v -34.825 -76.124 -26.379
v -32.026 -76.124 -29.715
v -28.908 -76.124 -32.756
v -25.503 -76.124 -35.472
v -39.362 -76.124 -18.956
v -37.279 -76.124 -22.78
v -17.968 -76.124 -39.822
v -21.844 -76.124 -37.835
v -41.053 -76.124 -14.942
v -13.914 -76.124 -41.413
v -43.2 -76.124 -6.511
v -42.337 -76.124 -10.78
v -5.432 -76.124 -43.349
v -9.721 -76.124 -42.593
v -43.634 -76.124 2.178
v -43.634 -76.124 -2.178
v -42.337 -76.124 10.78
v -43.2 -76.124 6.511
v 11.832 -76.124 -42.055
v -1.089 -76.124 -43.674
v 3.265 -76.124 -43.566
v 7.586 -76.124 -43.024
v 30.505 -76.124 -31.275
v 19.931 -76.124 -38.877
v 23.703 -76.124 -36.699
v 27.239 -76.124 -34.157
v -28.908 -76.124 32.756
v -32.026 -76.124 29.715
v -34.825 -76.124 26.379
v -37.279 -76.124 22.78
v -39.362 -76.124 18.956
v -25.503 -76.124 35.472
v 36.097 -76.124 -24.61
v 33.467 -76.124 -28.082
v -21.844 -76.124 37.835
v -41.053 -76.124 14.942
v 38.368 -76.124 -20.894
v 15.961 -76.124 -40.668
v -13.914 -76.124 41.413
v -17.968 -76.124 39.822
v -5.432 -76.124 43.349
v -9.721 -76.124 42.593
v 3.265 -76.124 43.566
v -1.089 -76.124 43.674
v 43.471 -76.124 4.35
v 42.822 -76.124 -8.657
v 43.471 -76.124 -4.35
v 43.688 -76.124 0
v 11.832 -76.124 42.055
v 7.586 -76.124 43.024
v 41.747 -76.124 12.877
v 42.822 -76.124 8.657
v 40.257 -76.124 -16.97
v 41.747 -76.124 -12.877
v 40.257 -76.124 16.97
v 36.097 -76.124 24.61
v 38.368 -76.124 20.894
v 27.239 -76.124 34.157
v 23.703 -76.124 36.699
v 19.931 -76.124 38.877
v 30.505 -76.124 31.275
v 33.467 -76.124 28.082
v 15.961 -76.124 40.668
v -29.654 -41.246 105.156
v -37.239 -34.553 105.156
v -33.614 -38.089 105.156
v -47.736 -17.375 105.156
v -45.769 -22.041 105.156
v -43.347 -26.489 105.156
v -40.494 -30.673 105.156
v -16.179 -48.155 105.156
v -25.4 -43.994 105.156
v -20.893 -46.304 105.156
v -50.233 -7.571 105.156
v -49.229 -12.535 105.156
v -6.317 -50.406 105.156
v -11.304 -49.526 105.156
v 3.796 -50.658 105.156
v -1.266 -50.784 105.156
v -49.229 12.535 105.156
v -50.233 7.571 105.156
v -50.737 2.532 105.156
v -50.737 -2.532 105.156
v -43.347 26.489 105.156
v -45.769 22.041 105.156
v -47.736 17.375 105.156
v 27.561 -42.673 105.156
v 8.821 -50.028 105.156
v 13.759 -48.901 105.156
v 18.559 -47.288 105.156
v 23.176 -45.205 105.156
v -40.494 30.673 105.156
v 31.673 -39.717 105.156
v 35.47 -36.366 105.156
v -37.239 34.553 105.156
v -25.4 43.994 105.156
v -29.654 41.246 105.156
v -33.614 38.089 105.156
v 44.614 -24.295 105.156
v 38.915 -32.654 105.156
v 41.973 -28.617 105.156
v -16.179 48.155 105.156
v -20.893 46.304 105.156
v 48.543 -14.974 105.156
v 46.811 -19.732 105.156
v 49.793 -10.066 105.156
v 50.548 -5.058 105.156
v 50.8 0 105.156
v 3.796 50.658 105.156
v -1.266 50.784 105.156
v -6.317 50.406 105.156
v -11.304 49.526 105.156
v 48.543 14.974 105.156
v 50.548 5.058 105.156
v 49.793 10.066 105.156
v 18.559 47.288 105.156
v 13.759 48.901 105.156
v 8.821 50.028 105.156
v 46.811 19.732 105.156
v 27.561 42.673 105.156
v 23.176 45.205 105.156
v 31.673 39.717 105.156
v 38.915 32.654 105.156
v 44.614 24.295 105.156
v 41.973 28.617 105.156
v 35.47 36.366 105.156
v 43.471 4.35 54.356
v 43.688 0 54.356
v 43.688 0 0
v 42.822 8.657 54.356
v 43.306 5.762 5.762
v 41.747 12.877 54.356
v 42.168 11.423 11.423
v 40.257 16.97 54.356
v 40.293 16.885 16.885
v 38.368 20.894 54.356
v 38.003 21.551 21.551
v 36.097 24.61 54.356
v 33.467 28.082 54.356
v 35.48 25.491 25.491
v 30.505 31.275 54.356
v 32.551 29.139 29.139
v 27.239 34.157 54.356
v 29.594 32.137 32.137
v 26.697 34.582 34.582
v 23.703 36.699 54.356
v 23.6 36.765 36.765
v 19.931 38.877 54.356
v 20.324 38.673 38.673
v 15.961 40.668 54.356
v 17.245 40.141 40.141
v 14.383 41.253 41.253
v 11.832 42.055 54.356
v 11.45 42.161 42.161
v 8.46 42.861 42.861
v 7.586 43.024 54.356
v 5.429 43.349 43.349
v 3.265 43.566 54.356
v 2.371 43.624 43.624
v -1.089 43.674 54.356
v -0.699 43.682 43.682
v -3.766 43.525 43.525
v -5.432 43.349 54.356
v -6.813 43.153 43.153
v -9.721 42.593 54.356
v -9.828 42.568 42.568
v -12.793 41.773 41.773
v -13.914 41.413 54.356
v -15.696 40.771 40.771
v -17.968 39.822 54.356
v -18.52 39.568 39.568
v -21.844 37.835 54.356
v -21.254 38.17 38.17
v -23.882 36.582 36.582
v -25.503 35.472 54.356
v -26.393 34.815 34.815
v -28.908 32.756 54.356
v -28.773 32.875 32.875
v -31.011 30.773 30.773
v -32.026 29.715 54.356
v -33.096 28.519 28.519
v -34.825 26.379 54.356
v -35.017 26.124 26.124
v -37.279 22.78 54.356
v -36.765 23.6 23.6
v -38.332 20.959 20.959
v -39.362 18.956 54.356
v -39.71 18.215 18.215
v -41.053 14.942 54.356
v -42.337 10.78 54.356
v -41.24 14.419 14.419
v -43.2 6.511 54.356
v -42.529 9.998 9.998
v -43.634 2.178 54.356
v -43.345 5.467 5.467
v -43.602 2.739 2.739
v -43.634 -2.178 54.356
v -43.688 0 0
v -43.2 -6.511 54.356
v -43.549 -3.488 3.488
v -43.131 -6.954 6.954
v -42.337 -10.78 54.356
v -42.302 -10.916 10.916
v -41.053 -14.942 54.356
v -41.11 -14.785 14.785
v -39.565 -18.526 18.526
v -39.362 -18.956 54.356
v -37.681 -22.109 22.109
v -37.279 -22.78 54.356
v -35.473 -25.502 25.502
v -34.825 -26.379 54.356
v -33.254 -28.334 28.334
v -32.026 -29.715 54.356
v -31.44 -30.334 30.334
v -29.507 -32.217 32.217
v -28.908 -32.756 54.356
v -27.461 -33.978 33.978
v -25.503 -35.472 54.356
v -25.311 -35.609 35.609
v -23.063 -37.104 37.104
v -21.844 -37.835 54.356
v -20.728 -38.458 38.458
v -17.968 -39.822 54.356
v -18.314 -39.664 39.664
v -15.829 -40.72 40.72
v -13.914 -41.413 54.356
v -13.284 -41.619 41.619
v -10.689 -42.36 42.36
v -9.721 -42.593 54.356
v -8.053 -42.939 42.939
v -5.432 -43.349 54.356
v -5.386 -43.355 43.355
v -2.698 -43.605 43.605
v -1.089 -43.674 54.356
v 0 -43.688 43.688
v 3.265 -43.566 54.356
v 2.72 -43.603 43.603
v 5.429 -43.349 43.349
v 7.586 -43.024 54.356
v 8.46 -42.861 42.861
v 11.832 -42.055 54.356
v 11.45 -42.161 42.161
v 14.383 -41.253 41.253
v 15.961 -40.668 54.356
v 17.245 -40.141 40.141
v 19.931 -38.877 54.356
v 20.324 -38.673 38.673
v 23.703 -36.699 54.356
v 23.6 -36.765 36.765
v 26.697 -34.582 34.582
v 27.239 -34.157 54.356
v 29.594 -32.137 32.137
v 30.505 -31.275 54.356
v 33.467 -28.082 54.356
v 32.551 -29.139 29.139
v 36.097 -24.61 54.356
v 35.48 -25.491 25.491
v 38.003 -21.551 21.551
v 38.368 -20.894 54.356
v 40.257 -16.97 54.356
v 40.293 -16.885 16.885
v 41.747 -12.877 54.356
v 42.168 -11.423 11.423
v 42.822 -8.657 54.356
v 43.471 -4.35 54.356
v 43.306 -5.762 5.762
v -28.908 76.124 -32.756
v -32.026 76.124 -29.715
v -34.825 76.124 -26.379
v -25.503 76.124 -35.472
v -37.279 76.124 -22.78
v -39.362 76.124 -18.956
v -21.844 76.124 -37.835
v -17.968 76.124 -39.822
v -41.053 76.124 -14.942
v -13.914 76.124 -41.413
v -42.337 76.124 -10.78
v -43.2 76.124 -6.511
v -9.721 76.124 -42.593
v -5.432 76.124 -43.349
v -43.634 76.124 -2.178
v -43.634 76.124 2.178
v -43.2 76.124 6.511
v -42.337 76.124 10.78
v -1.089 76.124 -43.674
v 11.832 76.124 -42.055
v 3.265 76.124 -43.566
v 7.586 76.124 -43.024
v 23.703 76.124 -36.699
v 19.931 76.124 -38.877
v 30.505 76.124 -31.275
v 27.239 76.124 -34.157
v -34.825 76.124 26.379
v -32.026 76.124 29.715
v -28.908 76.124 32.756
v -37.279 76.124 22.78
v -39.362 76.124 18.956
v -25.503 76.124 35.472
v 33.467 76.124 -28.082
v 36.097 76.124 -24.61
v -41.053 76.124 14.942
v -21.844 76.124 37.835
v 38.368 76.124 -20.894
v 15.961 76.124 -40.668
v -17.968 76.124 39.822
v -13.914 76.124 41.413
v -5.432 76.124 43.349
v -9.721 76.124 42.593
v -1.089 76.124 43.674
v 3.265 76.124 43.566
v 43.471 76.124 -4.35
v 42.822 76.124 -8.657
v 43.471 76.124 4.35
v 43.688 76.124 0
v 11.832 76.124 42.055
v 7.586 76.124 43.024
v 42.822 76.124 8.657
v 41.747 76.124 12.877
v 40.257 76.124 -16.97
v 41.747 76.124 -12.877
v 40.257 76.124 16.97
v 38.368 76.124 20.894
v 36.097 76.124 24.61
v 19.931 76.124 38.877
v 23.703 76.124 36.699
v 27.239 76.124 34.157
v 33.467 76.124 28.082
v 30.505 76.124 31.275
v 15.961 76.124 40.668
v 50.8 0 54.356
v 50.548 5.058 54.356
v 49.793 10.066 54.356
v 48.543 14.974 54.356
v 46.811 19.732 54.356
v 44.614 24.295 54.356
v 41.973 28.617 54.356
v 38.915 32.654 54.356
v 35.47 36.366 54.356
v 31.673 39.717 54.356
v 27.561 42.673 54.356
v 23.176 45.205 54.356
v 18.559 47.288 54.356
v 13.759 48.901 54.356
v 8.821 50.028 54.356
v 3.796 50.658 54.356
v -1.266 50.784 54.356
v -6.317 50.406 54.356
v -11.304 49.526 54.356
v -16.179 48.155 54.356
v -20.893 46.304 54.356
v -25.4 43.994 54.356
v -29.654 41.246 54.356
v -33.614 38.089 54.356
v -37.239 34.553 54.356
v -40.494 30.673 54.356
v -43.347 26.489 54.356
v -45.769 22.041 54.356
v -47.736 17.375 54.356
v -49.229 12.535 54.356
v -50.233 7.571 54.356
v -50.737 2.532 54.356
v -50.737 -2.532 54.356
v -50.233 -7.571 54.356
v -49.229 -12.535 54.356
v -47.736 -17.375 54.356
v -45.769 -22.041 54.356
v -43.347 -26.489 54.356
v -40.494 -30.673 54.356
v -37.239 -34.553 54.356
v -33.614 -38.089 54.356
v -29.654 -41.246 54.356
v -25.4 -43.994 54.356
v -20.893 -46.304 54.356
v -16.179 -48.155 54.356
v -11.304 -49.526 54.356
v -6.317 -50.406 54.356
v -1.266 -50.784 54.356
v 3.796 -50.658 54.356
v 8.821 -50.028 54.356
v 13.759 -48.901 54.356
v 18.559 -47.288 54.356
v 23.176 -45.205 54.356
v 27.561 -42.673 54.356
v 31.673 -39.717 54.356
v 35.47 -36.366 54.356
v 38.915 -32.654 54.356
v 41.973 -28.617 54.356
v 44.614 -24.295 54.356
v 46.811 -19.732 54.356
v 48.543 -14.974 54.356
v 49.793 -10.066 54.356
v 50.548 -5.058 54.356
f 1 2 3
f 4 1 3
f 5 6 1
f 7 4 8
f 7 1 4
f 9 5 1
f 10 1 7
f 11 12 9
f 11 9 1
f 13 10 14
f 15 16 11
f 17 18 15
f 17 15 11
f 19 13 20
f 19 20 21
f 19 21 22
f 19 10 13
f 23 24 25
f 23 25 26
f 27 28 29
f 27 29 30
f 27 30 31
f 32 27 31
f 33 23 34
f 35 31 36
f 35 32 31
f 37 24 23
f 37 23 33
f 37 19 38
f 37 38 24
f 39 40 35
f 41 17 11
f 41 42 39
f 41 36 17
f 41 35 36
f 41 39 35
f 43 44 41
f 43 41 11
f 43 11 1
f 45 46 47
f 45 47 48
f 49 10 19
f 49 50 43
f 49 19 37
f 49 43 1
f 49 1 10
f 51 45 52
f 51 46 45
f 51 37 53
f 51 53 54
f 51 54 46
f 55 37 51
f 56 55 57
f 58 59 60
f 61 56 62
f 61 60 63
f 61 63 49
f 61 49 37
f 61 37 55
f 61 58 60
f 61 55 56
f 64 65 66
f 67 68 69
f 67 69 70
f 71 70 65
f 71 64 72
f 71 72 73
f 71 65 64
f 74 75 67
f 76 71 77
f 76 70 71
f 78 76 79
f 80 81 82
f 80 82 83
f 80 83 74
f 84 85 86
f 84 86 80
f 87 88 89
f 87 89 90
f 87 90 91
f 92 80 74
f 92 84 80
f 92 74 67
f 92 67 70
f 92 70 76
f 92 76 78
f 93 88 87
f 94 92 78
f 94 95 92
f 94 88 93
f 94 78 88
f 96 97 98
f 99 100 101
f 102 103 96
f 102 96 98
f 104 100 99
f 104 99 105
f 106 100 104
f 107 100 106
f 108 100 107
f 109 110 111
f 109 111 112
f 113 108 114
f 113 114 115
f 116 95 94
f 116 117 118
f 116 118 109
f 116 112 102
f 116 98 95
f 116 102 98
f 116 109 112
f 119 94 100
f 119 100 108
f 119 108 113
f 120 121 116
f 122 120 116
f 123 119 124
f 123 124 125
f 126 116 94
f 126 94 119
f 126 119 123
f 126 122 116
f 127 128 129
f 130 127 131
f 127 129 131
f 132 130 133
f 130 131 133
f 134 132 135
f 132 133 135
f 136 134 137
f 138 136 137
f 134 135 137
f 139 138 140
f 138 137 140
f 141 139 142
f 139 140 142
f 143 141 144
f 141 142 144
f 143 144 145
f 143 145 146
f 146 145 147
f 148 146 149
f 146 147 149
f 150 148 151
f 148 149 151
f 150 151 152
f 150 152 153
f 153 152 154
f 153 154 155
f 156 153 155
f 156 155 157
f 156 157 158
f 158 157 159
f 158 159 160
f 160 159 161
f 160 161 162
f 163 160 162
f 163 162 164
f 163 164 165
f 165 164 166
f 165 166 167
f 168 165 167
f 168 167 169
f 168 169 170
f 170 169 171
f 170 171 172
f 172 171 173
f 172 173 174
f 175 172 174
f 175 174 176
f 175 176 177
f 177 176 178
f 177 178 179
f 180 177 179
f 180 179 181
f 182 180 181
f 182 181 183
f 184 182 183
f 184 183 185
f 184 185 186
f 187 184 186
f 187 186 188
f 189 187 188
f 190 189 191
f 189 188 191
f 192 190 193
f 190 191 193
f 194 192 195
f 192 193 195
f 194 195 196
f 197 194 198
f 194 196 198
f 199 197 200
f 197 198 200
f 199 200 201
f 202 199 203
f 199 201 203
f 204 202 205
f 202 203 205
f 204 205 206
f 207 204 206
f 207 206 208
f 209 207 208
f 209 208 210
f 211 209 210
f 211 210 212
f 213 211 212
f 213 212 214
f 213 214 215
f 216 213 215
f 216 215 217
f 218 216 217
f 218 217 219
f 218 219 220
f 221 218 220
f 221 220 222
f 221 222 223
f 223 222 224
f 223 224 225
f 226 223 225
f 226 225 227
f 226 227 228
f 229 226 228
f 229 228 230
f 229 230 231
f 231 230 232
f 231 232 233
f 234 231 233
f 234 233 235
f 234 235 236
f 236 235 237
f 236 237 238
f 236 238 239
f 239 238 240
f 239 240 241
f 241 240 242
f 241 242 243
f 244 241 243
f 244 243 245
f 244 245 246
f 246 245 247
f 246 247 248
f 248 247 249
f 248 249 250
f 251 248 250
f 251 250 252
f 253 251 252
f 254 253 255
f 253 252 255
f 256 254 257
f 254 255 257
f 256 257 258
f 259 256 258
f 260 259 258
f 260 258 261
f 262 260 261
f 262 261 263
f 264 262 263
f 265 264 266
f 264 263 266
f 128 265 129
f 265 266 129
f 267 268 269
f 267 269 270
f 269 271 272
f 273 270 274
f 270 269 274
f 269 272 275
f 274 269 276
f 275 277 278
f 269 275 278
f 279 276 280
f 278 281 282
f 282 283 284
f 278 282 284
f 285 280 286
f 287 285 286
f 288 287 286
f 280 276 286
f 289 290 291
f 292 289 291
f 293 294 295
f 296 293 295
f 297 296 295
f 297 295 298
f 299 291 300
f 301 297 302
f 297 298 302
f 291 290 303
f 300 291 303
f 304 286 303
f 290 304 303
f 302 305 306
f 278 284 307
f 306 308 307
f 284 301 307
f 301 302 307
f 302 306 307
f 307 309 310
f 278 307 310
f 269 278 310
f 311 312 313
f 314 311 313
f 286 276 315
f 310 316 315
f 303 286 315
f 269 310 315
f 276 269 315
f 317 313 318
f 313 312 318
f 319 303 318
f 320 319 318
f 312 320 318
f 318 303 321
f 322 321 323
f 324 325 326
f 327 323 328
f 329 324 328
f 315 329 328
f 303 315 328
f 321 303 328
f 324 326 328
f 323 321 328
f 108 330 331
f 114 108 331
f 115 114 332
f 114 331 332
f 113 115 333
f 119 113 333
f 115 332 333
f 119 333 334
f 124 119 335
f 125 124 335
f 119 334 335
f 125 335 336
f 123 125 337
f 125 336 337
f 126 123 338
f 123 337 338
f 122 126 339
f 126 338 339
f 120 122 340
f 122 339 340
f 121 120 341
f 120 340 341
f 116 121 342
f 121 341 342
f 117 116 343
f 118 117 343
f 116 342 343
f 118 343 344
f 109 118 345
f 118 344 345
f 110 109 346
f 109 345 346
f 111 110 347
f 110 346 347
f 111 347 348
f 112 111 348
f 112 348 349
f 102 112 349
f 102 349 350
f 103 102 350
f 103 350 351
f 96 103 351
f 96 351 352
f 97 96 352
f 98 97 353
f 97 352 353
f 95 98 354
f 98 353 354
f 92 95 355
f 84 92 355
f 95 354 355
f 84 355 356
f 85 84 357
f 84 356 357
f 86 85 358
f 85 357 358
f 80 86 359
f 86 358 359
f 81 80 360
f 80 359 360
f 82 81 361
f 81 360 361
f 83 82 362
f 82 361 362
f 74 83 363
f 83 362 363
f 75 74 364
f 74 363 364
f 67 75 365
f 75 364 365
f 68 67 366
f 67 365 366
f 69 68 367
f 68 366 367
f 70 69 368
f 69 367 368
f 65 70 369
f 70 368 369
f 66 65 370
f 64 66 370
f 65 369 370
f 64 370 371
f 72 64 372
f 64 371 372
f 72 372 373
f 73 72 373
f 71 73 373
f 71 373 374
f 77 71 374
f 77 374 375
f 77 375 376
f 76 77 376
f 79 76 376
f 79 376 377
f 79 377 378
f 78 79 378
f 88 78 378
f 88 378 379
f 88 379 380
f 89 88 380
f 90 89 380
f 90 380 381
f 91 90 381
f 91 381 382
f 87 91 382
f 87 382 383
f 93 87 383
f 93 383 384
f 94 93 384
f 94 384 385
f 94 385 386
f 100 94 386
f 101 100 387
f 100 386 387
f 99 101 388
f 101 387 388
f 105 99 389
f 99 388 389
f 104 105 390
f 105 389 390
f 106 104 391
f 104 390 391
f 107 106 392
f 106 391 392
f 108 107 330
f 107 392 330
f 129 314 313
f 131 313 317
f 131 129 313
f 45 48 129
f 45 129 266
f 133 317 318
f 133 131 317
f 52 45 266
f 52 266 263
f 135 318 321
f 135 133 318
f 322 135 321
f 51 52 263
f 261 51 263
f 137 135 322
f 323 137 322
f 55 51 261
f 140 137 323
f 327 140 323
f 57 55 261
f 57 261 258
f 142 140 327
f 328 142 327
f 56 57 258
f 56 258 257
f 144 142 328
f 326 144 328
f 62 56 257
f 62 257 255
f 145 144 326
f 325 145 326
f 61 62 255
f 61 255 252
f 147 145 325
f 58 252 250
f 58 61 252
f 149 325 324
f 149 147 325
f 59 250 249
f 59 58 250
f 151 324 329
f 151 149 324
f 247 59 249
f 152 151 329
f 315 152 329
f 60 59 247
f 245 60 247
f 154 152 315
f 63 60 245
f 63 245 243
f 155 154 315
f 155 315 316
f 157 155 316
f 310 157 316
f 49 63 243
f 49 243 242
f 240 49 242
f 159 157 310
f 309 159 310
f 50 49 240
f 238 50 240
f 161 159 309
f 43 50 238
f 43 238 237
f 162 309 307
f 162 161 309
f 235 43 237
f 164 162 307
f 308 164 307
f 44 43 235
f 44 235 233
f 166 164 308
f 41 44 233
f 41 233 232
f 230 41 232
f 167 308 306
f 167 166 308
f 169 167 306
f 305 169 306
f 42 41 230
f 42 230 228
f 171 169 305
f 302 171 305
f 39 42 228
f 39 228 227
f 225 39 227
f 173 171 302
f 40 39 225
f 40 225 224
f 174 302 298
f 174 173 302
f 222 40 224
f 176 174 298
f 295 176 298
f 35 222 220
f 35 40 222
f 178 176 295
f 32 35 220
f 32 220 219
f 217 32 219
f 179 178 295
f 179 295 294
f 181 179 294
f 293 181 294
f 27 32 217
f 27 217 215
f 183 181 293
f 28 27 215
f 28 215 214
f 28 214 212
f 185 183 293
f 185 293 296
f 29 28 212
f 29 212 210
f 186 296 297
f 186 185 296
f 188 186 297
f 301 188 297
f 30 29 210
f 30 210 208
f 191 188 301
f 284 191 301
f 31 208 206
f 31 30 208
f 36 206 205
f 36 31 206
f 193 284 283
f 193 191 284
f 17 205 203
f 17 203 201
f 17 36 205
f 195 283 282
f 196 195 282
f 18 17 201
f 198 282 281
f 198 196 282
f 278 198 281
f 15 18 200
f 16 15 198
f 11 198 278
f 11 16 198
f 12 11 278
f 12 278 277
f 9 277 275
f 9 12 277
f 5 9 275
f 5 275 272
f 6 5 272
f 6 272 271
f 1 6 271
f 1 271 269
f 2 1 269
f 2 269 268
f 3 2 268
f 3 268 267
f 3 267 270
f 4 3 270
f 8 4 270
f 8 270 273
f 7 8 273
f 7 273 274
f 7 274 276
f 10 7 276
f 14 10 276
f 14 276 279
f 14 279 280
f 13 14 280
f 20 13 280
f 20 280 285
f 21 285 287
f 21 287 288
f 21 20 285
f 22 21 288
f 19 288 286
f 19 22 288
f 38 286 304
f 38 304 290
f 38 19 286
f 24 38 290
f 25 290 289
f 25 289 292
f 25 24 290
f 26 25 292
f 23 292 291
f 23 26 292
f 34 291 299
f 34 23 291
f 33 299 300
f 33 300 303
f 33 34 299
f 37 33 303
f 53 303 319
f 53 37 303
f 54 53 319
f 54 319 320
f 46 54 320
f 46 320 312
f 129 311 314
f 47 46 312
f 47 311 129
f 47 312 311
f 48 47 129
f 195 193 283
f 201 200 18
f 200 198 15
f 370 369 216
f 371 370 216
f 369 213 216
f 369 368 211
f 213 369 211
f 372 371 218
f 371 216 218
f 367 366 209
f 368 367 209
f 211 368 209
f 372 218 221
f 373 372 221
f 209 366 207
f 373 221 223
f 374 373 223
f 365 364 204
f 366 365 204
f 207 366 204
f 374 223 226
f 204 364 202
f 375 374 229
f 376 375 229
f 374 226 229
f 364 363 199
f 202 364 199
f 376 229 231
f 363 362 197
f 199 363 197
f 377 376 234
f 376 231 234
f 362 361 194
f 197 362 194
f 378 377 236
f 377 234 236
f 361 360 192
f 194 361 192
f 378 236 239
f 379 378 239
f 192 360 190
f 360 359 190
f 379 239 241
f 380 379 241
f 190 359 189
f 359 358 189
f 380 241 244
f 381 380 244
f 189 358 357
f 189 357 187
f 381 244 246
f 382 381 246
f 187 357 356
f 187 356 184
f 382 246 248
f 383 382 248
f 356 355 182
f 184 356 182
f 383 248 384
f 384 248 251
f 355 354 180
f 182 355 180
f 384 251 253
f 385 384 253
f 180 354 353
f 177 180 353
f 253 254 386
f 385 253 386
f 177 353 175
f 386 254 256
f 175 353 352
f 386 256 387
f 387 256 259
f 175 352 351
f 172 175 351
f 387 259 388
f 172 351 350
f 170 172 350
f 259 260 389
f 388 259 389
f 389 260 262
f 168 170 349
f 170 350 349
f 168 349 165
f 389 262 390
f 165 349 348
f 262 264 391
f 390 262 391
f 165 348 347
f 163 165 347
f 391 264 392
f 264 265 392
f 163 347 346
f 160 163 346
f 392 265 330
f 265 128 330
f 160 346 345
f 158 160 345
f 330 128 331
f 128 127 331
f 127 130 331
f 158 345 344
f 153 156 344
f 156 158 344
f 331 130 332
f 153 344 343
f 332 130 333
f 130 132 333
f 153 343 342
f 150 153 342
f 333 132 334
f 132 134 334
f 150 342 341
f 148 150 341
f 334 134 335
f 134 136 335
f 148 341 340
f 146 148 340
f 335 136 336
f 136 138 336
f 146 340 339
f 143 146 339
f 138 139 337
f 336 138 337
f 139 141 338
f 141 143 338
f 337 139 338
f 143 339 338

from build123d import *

# Parameters (mm, degrees)
F0_R          = 43.688
F2_DEPTH      = 76.1238
F2_DEPTH_BACK = 76.1238
F1_R          = 43.688
F3_DEPTH      = 54.356
F4_R          = 50.8
F4_R_2        = 43.688
F5_DEPTH      = 50.8


with BuildPart() as f2:
    # F0 (on Front) → F2 (new body, two sides)
    with BuildSketch(Plane.XZ) as f2_sk:
        Circle(F0_R)
    extrude(amount=F2_DEPTH)
    extrude(f2_sk.sketch, amount=-F2_DEPTH_BACK)

    # F1 (on Top) → F3 (join)
    with BuildSketch(Plane.XY):
        Circle(F1_R)
    extrude(amount=F3_DEPTH)

    # F4 (on face) → F5 (join)
    with BuildSketch(Plane.XY.offset(54.356)):
        Circle(F4_R)
        Circle(F4_R_2, mode=Mode.SUBTRACT)
        Circle(F4_R_2)
    extrude(amount=F5_DEPTH)


solid = f2.part
